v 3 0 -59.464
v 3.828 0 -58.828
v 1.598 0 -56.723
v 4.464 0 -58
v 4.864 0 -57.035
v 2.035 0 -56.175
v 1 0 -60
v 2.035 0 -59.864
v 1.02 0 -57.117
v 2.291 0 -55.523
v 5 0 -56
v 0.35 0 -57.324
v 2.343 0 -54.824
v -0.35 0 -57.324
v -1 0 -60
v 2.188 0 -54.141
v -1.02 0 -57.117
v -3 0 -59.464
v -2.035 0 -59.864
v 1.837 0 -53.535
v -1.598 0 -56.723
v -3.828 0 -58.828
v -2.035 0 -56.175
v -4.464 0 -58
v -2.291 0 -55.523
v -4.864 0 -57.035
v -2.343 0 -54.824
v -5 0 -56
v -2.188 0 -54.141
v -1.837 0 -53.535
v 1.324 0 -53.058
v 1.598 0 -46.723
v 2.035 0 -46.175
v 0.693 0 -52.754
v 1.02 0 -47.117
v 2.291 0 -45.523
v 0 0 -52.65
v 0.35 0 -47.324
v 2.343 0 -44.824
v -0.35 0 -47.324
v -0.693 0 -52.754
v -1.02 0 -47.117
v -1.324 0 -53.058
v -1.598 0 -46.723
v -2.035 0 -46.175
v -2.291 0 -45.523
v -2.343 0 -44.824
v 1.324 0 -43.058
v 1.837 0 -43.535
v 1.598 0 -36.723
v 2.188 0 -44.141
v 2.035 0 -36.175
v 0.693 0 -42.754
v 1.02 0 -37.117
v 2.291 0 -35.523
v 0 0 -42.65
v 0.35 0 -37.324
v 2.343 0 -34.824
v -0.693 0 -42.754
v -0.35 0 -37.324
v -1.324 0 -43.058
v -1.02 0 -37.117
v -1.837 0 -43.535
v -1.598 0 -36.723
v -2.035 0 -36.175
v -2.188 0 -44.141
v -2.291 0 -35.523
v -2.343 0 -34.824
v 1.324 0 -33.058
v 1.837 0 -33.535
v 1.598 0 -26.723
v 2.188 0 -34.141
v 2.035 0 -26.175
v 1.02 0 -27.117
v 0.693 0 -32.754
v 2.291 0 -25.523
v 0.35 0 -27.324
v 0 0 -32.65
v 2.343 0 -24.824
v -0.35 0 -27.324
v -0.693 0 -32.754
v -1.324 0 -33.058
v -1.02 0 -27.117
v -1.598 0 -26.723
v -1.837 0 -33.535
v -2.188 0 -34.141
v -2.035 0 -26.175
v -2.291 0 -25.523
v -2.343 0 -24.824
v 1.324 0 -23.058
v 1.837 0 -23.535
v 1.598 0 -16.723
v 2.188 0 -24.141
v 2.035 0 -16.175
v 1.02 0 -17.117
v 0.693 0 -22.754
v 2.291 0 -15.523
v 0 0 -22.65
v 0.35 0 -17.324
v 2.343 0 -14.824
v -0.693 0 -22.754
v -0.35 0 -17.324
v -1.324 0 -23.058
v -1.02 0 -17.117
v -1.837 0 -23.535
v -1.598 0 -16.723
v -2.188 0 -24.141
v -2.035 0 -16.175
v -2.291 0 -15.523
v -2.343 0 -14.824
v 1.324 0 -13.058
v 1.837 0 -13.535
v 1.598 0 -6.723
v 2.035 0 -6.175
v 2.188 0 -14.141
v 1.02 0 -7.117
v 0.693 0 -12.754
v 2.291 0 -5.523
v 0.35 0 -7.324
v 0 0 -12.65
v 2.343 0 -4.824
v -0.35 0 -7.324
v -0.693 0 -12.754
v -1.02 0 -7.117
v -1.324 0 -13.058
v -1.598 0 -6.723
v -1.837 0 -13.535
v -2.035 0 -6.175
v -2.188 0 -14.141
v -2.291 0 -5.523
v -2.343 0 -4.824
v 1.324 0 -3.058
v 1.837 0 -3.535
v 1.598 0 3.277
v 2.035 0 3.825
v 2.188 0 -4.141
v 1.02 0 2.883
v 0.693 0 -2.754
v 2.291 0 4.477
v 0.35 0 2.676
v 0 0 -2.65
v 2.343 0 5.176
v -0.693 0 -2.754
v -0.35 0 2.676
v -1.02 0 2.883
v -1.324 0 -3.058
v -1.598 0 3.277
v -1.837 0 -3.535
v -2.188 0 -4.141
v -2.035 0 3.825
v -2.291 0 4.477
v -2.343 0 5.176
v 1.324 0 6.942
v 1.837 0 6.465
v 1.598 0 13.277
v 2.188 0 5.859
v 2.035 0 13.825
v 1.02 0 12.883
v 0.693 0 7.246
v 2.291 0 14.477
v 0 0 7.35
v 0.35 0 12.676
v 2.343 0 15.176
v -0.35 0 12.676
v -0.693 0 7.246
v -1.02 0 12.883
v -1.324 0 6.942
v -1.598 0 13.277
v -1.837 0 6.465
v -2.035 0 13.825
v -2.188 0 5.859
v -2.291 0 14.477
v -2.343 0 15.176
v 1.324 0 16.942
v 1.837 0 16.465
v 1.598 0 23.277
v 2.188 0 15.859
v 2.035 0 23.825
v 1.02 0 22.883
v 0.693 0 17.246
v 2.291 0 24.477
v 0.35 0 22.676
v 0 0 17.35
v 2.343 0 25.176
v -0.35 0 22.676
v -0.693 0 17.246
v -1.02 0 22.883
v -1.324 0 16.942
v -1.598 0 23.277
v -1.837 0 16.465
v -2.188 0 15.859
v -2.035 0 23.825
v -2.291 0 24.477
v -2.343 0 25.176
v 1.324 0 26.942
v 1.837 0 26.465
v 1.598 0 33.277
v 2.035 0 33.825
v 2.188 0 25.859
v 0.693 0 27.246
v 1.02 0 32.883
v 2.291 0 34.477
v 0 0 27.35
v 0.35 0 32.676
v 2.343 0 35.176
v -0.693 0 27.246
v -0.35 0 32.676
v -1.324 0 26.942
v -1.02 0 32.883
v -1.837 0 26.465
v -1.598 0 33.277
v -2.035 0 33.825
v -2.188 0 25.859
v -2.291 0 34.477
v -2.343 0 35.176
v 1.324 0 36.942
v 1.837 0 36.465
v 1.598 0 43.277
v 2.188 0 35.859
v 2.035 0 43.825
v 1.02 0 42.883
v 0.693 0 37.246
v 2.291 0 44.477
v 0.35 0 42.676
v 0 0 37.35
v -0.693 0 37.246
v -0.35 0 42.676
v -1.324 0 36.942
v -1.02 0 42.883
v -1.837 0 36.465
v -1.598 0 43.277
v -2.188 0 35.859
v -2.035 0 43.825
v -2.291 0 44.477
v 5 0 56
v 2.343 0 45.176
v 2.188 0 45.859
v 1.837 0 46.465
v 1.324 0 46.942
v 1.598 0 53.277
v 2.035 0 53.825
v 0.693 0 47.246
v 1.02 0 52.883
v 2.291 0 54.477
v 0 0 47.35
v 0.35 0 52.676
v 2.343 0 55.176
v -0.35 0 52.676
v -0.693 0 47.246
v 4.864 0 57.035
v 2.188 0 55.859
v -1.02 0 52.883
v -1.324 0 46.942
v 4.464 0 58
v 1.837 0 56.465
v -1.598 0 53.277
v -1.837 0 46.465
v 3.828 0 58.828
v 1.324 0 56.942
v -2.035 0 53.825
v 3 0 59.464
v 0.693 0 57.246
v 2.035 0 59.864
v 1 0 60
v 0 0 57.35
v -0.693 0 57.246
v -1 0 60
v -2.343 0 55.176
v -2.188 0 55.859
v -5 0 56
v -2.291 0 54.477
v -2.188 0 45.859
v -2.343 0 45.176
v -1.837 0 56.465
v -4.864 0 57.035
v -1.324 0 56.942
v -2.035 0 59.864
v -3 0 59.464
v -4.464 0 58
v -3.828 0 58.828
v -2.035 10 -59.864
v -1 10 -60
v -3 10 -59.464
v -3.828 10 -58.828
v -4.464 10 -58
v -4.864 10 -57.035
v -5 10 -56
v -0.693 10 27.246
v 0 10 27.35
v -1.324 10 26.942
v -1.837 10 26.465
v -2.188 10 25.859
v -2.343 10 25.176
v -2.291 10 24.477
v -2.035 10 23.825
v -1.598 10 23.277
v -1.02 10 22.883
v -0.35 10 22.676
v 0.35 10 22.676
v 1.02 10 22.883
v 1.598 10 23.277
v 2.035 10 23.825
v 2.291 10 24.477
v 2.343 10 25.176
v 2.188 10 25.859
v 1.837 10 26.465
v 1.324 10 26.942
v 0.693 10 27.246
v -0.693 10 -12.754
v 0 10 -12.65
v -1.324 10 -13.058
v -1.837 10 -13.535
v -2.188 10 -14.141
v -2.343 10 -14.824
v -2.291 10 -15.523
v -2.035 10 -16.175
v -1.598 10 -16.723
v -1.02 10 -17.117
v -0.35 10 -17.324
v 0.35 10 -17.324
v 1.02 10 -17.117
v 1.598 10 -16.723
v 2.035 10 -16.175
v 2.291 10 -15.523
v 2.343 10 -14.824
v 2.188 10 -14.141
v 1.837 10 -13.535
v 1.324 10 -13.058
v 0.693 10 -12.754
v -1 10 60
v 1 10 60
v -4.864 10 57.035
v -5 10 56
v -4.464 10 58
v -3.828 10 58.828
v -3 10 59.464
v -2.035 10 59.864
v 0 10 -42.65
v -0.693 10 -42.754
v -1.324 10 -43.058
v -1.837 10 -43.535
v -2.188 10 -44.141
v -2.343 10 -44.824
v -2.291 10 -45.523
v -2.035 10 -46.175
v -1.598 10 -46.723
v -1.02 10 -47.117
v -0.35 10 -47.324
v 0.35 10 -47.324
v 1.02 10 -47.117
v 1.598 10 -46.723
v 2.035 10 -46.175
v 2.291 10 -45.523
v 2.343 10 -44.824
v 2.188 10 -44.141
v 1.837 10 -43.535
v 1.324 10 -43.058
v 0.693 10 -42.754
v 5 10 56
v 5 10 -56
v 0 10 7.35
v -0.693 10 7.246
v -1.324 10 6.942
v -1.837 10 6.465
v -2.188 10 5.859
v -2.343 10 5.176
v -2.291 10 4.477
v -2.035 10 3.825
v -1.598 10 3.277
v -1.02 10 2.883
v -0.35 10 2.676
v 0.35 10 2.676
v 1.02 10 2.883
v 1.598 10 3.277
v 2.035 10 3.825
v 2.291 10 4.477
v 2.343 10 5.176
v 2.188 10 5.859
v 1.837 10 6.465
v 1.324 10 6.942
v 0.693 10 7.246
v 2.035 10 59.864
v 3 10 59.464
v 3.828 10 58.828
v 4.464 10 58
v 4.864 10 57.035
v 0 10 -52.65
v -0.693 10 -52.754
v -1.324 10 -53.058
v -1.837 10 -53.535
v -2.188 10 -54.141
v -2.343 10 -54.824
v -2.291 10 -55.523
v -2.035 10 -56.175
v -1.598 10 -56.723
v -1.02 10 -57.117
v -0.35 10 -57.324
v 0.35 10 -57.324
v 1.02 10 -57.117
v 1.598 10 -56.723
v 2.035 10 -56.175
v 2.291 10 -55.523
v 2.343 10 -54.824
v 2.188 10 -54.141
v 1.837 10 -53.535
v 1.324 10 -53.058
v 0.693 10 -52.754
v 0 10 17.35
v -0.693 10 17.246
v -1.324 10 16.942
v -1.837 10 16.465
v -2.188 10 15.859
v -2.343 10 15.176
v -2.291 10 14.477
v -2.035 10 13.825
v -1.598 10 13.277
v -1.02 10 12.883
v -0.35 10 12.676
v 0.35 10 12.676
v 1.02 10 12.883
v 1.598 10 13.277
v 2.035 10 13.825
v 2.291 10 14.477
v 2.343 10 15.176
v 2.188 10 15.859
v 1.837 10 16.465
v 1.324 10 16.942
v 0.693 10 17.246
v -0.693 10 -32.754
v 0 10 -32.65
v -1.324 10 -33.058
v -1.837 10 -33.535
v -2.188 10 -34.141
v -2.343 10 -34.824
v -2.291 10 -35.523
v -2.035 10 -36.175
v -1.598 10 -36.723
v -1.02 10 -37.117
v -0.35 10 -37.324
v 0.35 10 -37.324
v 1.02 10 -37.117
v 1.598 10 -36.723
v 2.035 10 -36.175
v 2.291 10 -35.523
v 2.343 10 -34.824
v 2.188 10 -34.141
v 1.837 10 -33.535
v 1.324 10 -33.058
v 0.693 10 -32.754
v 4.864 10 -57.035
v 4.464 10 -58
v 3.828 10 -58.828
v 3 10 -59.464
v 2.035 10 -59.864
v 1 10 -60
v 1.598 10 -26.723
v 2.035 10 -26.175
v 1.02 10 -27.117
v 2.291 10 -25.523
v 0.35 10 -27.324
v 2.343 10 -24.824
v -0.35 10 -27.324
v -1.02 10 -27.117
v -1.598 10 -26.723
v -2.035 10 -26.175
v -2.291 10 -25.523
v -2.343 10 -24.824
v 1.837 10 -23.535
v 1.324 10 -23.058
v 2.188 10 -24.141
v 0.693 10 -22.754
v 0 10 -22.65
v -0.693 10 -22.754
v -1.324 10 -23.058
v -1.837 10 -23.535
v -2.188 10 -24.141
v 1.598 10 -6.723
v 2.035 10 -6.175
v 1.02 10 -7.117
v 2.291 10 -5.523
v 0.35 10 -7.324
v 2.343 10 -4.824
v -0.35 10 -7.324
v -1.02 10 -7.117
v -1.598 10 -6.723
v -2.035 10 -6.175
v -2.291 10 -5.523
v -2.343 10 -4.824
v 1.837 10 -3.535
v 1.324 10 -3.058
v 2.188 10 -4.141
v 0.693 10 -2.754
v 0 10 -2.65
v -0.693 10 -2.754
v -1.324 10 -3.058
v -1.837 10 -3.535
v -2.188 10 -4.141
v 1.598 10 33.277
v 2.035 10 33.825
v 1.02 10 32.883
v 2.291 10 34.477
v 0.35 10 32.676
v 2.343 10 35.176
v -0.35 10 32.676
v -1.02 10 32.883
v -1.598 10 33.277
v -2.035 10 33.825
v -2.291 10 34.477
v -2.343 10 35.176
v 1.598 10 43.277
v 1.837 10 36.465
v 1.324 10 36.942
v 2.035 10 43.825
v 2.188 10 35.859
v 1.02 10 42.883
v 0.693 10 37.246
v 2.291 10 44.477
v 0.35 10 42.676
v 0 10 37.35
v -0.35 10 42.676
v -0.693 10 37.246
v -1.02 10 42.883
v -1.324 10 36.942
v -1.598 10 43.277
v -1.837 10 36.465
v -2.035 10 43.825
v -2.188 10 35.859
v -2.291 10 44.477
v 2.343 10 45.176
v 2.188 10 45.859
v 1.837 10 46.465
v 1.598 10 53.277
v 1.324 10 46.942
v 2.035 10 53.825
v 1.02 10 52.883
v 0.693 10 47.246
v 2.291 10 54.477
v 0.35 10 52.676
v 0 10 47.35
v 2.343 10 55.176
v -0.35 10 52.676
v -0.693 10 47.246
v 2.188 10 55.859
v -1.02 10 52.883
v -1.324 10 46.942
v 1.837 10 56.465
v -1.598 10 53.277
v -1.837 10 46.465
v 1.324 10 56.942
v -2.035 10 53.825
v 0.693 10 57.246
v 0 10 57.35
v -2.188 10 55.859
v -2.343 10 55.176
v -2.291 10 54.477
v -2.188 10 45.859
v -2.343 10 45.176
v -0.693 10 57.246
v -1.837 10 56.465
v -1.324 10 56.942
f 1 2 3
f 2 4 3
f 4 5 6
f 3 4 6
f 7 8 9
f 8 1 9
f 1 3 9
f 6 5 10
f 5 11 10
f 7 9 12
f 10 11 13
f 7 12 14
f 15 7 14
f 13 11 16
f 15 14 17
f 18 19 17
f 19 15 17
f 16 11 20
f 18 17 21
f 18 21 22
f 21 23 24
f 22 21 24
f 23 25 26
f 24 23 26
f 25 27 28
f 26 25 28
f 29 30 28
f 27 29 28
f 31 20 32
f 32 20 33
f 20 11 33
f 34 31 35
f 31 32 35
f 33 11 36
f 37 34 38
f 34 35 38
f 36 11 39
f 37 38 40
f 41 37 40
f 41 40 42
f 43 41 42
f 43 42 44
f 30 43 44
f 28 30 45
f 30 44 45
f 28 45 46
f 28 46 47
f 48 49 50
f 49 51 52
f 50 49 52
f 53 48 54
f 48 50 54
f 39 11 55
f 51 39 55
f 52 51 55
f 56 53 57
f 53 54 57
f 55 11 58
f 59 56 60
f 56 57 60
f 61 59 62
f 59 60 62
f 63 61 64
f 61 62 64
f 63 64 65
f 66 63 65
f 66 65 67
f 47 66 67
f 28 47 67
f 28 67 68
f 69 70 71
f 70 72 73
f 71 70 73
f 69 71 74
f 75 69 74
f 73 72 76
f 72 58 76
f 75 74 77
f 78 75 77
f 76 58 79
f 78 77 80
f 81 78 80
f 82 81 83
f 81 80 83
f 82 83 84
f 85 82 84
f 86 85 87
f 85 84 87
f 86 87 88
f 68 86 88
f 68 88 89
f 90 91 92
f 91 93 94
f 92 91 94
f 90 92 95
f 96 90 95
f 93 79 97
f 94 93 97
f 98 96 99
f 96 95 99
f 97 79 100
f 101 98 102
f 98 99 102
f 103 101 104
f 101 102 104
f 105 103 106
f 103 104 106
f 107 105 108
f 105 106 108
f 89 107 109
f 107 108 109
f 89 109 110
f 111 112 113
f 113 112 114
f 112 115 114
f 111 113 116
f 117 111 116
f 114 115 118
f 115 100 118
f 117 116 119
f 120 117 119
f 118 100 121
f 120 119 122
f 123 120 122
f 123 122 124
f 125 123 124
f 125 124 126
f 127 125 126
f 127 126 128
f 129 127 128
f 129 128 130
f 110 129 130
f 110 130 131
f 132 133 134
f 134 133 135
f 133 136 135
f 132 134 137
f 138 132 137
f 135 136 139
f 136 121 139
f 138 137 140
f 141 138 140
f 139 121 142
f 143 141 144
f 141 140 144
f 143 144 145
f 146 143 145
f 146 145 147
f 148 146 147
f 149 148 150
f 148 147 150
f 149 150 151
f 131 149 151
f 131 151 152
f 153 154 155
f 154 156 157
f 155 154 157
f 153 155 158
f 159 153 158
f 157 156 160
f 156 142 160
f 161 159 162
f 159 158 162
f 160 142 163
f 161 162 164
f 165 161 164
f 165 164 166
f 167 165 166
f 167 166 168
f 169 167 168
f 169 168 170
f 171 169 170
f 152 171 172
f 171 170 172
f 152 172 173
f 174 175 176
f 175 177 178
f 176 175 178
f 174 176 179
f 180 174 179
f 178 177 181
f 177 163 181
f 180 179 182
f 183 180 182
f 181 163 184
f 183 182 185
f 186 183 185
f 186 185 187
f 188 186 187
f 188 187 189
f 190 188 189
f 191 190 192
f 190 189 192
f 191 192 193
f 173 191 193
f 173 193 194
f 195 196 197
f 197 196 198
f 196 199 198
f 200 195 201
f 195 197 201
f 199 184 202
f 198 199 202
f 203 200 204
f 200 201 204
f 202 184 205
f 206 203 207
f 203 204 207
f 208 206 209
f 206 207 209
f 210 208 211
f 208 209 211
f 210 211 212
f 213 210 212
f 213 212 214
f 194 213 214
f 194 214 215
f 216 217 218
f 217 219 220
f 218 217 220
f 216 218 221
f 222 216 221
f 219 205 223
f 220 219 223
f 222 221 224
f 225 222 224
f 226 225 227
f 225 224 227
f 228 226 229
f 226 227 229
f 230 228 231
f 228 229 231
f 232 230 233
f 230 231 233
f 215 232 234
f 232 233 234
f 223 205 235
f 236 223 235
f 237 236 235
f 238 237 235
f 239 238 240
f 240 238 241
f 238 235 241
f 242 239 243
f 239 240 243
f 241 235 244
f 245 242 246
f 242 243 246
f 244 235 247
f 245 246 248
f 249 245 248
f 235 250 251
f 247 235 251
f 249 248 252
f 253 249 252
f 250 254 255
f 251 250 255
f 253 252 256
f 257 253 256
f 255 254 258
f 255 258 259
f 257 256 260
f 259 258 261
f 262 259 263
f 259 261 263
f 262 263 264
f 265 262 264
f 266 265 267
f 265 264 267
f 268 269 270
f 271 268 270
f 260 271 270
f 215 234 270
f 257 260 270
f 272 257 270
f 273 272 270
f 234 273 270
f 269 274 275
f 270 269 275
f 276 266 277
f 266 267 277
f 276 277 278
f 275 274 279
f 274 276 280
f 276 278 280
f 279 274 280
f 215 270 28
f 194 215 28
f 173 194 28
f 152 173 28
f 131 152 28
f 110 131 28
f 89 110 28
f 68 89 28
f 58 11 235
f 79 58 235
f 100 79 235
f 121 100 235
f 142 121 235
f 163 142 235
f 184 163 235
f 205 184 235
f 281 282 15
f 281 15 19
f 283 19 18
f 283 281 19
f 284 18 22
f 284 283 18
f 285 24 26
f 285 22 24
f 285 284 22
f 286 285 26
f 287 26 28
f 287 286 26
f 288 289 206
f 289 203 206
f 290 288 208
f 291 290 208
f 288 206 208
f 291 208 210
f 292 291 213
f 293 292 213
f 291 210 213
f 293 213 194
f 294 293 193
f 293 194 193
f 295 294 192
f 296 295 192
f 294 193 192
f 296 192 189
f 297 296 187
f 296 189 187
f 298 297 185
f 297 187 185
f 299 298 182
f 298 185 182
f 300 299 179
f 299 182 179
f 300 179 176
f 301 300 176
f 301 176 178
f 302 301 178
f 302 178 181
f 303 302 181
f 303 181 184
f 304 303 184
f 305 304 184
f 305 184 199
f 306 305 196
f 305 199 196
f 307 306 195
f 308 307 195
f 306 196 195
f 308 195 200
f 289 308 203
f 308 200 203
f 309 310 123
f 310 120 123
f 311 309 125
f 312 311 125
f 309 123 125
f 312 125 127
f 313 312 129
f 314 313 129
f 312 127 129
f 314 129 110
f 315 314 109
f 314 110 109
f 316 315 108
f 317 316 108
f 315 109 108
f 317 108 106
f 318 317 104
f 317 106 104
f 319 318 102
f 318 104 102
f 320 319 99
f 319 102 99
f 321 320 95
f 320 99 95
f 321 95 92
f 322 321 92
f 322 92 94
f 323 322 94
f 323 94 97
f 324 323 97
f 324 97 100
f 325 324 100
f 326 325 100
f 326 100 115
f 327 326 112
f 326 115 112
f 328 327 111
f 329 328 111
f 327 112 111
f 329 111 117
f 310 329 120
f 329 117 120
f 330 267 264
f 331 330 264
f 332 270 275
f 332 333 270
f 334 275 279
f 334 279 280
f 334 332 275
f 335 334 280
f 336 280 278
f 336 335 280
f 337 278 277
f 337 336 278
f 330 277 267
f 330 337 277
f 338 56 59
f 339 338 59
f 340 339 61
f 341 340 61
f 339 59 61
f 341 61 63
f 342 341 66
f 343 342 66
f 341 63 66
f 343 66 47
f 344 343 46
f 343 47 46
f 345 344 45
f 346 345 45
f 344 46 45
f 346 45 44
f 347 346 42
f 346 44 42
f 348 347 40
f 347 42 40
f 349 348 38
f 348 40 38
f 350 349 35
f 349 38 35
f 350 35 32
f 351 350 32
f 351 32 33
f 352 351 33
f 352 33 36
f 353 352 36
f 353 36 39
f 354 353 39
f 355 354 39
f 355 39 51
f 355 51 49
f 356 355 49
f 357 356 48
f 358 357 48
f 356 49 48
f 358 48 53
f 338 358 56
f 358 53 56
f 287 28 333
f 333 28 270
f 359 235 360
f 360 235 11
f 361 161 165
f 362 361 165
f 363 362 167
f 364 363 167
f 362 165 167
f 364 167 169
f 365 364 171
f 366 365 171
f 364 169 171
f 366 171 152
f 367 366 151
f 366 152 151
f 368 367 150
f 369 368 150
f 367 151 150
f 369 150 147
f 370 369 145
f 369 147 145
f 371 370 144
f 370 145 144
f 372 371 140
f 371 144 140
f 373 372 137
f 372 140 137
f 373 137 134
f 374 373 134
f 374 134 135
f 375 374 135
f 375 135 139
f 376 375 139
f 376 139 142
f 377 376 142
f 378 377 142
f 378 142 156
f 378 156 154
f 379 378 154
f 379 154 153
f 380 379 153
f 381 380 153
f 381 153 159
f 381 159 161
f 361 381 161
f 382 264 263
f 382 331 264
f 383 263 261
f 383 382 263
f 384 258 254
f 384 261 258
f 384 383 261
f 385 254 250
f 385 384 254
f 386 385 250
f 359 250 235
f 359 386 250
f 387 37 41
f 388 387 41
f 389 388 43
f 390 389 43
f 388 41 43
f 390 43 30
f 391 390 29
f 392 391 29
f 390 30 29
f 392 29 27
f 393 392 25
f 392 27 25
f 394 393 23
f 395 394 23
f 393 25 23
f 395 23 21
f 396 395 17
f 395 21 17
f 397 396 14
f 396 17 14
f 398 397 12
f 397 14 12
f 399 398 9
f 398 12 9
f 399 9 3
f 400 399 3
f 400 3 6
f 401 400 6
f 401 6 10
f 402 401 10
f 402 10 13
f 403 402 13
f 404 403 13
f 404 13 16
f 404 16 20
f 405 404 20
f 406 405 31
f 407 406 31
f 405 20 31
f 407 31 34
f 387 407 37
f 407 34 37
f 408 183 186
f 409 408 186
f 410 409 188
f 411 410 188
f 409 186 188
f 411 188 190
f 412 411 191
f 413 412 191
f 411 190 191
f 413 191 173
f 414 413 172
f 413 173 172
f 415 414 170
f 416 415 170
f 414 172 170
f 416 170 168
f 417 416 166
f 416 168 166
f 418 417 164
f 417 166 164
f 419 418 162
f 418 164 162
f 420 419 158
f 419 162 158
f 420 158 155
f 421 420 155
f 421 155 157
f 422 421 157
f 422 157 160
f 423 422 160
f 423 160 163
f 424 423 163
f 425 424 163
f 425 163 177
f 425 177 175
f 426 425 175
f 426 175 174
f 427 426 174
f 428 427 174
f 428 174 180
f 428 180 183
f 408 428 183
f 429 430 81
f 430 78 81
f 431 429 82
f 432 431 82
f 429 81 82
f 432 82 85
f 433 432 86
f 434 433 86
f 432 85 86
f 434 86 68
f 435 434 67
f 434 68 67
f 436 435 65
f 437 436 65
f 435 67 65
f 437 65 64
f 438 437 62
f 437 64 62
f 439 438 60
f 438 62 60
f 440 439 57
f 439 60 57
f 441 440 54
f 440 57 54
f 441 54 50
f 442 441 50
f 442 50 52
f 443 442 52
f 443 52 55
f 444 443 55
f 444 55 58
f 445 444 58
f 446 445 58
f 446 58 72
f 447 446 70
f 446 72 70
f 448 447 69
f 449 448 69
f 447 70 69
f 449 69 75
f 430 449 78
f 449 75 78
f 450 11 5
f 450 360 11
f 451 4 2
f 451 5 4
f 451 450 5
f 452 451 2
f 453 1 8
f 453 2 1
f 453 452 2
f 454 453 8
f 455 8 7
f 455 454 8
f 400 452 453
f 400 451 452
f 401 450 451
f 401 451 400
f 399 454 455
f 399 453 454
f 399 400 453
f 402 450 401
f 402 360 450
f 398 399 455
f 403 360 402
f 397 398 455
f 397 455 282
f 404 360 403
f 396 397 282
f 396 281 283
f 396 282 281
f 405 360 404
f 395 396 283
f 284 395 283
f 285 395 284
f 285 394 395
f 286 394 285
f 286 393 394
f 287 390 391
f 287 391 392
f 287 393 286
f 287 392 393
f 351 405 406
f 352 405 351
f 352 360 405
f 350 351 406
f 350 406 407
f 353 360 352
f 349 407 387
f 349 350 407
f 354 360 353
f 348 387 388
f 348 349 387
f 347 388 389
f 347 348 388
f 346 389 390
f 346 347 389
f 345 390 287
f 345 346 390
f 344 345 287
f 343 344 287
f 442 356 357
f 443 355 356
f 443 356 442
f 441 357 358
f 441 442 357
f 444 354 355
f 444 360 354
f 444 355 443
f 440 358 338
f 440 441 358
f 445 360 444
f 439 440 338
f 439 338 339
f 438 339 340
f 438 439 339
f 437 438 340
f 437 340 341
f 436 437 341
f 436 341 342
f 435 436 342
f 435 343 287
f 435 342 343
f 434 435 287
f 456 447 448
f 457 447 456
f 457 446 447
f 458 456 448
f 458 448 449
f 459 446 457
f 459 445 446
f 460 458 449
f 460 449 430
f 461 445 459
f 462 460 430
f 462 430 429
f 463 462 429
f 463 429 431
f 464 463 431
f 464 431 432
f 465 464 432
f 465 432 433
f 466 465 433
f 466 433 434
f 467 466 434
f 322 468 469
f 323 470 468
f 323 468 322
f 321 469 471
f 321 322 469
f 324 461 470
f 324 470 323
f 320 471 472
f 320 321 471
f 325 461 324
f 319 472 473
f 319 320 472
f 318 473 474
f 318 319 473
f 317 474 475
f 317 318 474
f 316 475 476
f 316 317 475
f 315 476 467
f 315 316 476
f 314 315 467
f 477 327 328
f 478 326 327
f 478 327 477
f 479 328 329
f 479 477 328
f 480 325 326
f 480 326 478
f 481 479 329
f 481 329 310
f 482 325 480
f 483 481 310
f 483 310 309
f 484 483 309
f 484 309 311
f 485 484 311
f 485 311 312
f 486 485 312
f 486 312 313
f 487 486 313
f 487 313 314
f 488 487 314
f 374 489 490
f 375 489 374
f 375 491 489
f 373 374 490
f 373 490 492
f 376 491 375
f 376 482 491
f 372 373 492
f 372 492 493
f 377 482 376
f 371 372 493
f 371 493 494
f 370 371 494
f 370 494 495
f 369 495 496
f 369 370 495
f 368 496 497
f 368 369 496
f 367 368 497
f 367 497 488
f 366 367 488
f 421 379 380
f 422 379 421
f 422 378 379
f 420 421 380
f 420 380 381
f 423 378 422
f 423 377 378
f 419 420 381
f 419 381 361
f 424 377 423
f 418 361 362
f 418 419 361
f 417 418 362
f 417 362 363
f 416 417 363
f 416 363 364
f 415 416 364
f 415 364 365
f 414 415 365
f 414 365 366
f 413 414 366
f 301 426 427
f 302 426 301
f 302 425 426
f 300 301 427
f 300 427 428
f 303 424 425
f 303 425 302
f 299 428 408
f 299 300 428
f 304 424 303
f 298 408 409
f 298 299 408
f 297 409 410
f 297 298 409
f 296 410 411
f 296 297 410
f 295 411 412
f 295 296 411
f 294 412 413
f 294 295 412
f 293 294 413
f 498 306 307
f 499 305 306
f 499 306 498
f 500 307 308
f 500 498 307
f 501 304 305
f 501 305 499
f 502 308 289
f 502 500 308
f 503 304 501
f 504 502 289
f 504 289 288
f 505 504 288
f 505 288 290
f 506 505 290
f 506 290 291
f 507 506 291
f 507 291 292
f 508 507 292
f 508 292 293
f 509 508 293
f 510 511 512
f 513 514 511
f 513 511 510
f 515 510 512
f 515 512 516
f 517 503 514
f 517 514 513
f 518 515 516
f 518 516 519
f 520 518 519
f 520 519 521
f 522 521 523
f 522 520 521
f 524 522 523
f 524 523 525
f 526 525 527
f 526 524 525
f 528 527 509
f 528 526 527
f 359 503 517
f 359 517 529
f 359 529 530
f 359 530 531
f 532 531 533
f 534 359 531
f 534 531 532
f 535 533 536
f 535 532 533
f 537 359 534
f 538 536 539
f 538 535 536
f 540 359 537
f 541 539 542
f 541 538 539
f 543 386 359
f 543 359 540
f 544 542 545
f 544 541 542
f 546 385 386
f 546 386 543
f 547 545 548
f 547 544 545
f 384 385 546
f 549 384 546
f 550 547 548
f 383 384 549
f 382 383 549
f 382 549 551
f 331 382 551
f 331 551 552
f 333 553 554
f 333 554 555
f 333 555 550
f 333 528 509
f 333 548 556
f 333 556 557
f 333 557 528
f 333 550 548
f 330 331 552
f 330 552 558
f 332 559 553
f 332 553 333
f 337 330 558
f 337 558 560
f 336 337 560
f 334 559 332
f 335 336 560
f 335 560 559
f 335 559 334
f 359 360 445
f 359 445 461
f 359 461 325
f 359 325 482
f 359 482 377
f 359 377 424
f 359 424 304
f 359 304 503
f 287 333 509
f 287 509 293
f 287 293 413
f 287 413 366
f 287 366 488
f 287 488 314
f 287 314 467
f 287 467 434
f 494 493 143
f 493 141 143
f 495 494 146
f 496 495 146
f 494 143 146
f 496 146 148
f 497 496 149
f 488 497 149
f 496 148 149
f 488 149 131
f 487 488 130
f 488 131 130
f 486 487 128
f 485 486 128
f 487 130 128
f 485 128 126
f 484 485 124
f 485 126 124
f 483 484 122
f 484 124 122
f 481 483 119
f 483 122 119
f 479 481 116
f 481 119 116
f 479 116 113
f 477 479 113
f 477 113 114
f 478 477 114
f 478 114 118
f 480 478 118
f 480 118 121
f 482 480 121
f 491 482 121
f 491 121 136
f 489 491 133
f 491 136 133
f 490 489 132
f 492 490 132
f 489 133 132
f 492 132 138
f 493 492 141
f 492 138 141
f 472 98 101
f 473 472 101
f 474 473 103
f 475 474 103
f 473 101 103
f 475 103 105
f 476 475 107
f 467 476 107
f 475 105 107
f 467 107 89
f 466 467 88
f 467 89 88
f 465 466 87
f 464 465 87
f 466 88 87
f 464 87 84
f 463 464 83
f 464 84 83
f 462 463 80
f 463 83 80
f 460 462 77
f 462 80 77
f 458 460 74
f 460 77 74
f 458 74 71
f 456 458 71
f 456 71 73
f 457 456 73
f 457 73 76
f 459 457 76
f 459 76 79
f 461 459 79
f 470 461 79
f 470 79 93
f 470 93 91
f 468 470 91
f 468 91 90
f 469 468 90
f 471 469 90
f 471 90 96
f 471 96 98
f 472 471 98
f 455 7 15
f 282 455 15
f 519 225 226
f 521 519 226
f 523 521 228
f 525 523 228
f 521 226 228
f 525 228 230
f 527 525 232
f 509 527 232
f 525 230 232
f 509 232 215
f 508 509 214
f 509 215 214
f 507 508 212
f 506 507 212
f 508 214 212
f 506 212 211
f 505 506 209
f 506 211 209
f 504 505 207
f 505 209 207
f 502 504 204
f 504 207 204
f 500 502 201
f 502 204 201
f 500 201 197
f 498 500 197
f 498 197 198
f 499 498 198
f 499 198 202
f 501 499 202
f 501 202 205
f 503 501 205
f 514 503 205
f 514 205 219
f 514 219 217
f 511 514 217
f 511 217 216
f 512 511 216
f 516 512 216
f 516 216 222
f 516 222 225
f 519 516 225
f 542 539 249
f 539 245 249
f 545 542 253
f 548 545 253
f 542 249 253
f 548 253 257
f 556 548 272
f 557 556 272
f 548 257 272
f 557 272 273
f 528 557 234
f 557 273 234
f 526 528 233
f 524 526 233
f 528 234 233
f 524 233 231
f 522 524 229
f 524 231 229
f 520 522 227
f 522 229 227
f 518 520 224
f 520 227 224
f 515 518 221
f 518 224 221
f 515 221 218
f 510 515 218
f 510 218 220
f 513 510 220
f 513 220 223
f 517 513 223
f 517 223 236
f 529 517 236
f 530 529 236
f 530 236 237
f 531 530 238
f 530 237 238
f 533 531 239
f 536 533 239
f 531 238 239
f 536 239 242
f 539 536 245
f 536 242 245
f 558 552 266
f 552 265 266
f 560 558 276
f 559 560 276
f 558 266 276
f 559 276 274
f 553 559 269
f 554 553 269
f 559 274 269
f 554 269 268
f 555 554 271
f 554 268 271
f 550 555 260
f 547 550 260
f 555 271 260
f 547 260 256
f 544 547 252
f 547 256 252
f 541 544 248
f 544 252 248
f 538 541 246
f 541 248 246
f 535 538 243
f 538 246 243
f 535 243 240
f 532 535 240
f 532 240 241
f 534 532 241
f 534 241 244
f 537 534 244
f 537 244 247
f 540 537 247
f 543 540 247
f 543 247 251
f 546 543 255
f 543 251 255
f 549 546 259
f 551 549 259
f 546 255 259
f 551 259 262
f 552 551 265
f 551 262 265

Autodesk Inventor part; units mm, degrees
ref_plane "YZ Plane" through (0, 0, 0) normal (1, 0, 0) x (0, 1, 0)
ref_plane "XZ Plane" through (0, 0, 0) normal (0, 1, 0) x (-1, 0, 0)
ref_plane "XY Plane" through (0, 0, 0) normal (0, 0, 1) x (1, 0, 0)
sketch "Sketch1" plane through (0, 0, 0) normal (0, 1, 0) x (-1, 0, 0)
  line L0 (5, 60) -> (-5, 60)
  line L1 (-5, 60) -> (-5, -60)
  line L2 (-5, -60) -> (5, -60)
  line L3 (5, -60) -> (5, 60)
  line L4 (5, 60) -> (-5, -60) construction
  line L5 (-5, 60) -> (5, -60) construction
  point P0 (0, 0)
  dimension "d0" = 10
  dimension "d1" = 120
extrude "Extrusion1" add sketch "Sketch1" along normal blind 10
fillet "Fillet1" radius 4 4 edges at (5, 5, 60) (-5, 5, 60) (-5, 5, -60) (5, 5, -60)
sketch "Sketch2" plane through (0, 10, 0) normal (0, 1, 0) x (1, 0, 0)
  line L0 (1, 60) -> (-1, 60) projected
  line L1 (0, 60) -> (0, -50)
  line L2 (-1, 60) -> (-1, 55)
  arc A0 (-1, 60) -> (-5, 56) centre (-1, 56) ccw projected
  line L3 (-1, 55) -> (0, 55)
  point P0 (0, 0)
  dimension "d5" = 110
  dimension "d6" = 5
hole "Hole1" at (0, 10, -55) direction (0, -1, 0) diameter 4.7 depth 12
pattern_linear "Rectangular Pattern1" count 12 spacing 10 along (0, 0, 1) of "Hole1"
properties part number "soporte de direccion"
